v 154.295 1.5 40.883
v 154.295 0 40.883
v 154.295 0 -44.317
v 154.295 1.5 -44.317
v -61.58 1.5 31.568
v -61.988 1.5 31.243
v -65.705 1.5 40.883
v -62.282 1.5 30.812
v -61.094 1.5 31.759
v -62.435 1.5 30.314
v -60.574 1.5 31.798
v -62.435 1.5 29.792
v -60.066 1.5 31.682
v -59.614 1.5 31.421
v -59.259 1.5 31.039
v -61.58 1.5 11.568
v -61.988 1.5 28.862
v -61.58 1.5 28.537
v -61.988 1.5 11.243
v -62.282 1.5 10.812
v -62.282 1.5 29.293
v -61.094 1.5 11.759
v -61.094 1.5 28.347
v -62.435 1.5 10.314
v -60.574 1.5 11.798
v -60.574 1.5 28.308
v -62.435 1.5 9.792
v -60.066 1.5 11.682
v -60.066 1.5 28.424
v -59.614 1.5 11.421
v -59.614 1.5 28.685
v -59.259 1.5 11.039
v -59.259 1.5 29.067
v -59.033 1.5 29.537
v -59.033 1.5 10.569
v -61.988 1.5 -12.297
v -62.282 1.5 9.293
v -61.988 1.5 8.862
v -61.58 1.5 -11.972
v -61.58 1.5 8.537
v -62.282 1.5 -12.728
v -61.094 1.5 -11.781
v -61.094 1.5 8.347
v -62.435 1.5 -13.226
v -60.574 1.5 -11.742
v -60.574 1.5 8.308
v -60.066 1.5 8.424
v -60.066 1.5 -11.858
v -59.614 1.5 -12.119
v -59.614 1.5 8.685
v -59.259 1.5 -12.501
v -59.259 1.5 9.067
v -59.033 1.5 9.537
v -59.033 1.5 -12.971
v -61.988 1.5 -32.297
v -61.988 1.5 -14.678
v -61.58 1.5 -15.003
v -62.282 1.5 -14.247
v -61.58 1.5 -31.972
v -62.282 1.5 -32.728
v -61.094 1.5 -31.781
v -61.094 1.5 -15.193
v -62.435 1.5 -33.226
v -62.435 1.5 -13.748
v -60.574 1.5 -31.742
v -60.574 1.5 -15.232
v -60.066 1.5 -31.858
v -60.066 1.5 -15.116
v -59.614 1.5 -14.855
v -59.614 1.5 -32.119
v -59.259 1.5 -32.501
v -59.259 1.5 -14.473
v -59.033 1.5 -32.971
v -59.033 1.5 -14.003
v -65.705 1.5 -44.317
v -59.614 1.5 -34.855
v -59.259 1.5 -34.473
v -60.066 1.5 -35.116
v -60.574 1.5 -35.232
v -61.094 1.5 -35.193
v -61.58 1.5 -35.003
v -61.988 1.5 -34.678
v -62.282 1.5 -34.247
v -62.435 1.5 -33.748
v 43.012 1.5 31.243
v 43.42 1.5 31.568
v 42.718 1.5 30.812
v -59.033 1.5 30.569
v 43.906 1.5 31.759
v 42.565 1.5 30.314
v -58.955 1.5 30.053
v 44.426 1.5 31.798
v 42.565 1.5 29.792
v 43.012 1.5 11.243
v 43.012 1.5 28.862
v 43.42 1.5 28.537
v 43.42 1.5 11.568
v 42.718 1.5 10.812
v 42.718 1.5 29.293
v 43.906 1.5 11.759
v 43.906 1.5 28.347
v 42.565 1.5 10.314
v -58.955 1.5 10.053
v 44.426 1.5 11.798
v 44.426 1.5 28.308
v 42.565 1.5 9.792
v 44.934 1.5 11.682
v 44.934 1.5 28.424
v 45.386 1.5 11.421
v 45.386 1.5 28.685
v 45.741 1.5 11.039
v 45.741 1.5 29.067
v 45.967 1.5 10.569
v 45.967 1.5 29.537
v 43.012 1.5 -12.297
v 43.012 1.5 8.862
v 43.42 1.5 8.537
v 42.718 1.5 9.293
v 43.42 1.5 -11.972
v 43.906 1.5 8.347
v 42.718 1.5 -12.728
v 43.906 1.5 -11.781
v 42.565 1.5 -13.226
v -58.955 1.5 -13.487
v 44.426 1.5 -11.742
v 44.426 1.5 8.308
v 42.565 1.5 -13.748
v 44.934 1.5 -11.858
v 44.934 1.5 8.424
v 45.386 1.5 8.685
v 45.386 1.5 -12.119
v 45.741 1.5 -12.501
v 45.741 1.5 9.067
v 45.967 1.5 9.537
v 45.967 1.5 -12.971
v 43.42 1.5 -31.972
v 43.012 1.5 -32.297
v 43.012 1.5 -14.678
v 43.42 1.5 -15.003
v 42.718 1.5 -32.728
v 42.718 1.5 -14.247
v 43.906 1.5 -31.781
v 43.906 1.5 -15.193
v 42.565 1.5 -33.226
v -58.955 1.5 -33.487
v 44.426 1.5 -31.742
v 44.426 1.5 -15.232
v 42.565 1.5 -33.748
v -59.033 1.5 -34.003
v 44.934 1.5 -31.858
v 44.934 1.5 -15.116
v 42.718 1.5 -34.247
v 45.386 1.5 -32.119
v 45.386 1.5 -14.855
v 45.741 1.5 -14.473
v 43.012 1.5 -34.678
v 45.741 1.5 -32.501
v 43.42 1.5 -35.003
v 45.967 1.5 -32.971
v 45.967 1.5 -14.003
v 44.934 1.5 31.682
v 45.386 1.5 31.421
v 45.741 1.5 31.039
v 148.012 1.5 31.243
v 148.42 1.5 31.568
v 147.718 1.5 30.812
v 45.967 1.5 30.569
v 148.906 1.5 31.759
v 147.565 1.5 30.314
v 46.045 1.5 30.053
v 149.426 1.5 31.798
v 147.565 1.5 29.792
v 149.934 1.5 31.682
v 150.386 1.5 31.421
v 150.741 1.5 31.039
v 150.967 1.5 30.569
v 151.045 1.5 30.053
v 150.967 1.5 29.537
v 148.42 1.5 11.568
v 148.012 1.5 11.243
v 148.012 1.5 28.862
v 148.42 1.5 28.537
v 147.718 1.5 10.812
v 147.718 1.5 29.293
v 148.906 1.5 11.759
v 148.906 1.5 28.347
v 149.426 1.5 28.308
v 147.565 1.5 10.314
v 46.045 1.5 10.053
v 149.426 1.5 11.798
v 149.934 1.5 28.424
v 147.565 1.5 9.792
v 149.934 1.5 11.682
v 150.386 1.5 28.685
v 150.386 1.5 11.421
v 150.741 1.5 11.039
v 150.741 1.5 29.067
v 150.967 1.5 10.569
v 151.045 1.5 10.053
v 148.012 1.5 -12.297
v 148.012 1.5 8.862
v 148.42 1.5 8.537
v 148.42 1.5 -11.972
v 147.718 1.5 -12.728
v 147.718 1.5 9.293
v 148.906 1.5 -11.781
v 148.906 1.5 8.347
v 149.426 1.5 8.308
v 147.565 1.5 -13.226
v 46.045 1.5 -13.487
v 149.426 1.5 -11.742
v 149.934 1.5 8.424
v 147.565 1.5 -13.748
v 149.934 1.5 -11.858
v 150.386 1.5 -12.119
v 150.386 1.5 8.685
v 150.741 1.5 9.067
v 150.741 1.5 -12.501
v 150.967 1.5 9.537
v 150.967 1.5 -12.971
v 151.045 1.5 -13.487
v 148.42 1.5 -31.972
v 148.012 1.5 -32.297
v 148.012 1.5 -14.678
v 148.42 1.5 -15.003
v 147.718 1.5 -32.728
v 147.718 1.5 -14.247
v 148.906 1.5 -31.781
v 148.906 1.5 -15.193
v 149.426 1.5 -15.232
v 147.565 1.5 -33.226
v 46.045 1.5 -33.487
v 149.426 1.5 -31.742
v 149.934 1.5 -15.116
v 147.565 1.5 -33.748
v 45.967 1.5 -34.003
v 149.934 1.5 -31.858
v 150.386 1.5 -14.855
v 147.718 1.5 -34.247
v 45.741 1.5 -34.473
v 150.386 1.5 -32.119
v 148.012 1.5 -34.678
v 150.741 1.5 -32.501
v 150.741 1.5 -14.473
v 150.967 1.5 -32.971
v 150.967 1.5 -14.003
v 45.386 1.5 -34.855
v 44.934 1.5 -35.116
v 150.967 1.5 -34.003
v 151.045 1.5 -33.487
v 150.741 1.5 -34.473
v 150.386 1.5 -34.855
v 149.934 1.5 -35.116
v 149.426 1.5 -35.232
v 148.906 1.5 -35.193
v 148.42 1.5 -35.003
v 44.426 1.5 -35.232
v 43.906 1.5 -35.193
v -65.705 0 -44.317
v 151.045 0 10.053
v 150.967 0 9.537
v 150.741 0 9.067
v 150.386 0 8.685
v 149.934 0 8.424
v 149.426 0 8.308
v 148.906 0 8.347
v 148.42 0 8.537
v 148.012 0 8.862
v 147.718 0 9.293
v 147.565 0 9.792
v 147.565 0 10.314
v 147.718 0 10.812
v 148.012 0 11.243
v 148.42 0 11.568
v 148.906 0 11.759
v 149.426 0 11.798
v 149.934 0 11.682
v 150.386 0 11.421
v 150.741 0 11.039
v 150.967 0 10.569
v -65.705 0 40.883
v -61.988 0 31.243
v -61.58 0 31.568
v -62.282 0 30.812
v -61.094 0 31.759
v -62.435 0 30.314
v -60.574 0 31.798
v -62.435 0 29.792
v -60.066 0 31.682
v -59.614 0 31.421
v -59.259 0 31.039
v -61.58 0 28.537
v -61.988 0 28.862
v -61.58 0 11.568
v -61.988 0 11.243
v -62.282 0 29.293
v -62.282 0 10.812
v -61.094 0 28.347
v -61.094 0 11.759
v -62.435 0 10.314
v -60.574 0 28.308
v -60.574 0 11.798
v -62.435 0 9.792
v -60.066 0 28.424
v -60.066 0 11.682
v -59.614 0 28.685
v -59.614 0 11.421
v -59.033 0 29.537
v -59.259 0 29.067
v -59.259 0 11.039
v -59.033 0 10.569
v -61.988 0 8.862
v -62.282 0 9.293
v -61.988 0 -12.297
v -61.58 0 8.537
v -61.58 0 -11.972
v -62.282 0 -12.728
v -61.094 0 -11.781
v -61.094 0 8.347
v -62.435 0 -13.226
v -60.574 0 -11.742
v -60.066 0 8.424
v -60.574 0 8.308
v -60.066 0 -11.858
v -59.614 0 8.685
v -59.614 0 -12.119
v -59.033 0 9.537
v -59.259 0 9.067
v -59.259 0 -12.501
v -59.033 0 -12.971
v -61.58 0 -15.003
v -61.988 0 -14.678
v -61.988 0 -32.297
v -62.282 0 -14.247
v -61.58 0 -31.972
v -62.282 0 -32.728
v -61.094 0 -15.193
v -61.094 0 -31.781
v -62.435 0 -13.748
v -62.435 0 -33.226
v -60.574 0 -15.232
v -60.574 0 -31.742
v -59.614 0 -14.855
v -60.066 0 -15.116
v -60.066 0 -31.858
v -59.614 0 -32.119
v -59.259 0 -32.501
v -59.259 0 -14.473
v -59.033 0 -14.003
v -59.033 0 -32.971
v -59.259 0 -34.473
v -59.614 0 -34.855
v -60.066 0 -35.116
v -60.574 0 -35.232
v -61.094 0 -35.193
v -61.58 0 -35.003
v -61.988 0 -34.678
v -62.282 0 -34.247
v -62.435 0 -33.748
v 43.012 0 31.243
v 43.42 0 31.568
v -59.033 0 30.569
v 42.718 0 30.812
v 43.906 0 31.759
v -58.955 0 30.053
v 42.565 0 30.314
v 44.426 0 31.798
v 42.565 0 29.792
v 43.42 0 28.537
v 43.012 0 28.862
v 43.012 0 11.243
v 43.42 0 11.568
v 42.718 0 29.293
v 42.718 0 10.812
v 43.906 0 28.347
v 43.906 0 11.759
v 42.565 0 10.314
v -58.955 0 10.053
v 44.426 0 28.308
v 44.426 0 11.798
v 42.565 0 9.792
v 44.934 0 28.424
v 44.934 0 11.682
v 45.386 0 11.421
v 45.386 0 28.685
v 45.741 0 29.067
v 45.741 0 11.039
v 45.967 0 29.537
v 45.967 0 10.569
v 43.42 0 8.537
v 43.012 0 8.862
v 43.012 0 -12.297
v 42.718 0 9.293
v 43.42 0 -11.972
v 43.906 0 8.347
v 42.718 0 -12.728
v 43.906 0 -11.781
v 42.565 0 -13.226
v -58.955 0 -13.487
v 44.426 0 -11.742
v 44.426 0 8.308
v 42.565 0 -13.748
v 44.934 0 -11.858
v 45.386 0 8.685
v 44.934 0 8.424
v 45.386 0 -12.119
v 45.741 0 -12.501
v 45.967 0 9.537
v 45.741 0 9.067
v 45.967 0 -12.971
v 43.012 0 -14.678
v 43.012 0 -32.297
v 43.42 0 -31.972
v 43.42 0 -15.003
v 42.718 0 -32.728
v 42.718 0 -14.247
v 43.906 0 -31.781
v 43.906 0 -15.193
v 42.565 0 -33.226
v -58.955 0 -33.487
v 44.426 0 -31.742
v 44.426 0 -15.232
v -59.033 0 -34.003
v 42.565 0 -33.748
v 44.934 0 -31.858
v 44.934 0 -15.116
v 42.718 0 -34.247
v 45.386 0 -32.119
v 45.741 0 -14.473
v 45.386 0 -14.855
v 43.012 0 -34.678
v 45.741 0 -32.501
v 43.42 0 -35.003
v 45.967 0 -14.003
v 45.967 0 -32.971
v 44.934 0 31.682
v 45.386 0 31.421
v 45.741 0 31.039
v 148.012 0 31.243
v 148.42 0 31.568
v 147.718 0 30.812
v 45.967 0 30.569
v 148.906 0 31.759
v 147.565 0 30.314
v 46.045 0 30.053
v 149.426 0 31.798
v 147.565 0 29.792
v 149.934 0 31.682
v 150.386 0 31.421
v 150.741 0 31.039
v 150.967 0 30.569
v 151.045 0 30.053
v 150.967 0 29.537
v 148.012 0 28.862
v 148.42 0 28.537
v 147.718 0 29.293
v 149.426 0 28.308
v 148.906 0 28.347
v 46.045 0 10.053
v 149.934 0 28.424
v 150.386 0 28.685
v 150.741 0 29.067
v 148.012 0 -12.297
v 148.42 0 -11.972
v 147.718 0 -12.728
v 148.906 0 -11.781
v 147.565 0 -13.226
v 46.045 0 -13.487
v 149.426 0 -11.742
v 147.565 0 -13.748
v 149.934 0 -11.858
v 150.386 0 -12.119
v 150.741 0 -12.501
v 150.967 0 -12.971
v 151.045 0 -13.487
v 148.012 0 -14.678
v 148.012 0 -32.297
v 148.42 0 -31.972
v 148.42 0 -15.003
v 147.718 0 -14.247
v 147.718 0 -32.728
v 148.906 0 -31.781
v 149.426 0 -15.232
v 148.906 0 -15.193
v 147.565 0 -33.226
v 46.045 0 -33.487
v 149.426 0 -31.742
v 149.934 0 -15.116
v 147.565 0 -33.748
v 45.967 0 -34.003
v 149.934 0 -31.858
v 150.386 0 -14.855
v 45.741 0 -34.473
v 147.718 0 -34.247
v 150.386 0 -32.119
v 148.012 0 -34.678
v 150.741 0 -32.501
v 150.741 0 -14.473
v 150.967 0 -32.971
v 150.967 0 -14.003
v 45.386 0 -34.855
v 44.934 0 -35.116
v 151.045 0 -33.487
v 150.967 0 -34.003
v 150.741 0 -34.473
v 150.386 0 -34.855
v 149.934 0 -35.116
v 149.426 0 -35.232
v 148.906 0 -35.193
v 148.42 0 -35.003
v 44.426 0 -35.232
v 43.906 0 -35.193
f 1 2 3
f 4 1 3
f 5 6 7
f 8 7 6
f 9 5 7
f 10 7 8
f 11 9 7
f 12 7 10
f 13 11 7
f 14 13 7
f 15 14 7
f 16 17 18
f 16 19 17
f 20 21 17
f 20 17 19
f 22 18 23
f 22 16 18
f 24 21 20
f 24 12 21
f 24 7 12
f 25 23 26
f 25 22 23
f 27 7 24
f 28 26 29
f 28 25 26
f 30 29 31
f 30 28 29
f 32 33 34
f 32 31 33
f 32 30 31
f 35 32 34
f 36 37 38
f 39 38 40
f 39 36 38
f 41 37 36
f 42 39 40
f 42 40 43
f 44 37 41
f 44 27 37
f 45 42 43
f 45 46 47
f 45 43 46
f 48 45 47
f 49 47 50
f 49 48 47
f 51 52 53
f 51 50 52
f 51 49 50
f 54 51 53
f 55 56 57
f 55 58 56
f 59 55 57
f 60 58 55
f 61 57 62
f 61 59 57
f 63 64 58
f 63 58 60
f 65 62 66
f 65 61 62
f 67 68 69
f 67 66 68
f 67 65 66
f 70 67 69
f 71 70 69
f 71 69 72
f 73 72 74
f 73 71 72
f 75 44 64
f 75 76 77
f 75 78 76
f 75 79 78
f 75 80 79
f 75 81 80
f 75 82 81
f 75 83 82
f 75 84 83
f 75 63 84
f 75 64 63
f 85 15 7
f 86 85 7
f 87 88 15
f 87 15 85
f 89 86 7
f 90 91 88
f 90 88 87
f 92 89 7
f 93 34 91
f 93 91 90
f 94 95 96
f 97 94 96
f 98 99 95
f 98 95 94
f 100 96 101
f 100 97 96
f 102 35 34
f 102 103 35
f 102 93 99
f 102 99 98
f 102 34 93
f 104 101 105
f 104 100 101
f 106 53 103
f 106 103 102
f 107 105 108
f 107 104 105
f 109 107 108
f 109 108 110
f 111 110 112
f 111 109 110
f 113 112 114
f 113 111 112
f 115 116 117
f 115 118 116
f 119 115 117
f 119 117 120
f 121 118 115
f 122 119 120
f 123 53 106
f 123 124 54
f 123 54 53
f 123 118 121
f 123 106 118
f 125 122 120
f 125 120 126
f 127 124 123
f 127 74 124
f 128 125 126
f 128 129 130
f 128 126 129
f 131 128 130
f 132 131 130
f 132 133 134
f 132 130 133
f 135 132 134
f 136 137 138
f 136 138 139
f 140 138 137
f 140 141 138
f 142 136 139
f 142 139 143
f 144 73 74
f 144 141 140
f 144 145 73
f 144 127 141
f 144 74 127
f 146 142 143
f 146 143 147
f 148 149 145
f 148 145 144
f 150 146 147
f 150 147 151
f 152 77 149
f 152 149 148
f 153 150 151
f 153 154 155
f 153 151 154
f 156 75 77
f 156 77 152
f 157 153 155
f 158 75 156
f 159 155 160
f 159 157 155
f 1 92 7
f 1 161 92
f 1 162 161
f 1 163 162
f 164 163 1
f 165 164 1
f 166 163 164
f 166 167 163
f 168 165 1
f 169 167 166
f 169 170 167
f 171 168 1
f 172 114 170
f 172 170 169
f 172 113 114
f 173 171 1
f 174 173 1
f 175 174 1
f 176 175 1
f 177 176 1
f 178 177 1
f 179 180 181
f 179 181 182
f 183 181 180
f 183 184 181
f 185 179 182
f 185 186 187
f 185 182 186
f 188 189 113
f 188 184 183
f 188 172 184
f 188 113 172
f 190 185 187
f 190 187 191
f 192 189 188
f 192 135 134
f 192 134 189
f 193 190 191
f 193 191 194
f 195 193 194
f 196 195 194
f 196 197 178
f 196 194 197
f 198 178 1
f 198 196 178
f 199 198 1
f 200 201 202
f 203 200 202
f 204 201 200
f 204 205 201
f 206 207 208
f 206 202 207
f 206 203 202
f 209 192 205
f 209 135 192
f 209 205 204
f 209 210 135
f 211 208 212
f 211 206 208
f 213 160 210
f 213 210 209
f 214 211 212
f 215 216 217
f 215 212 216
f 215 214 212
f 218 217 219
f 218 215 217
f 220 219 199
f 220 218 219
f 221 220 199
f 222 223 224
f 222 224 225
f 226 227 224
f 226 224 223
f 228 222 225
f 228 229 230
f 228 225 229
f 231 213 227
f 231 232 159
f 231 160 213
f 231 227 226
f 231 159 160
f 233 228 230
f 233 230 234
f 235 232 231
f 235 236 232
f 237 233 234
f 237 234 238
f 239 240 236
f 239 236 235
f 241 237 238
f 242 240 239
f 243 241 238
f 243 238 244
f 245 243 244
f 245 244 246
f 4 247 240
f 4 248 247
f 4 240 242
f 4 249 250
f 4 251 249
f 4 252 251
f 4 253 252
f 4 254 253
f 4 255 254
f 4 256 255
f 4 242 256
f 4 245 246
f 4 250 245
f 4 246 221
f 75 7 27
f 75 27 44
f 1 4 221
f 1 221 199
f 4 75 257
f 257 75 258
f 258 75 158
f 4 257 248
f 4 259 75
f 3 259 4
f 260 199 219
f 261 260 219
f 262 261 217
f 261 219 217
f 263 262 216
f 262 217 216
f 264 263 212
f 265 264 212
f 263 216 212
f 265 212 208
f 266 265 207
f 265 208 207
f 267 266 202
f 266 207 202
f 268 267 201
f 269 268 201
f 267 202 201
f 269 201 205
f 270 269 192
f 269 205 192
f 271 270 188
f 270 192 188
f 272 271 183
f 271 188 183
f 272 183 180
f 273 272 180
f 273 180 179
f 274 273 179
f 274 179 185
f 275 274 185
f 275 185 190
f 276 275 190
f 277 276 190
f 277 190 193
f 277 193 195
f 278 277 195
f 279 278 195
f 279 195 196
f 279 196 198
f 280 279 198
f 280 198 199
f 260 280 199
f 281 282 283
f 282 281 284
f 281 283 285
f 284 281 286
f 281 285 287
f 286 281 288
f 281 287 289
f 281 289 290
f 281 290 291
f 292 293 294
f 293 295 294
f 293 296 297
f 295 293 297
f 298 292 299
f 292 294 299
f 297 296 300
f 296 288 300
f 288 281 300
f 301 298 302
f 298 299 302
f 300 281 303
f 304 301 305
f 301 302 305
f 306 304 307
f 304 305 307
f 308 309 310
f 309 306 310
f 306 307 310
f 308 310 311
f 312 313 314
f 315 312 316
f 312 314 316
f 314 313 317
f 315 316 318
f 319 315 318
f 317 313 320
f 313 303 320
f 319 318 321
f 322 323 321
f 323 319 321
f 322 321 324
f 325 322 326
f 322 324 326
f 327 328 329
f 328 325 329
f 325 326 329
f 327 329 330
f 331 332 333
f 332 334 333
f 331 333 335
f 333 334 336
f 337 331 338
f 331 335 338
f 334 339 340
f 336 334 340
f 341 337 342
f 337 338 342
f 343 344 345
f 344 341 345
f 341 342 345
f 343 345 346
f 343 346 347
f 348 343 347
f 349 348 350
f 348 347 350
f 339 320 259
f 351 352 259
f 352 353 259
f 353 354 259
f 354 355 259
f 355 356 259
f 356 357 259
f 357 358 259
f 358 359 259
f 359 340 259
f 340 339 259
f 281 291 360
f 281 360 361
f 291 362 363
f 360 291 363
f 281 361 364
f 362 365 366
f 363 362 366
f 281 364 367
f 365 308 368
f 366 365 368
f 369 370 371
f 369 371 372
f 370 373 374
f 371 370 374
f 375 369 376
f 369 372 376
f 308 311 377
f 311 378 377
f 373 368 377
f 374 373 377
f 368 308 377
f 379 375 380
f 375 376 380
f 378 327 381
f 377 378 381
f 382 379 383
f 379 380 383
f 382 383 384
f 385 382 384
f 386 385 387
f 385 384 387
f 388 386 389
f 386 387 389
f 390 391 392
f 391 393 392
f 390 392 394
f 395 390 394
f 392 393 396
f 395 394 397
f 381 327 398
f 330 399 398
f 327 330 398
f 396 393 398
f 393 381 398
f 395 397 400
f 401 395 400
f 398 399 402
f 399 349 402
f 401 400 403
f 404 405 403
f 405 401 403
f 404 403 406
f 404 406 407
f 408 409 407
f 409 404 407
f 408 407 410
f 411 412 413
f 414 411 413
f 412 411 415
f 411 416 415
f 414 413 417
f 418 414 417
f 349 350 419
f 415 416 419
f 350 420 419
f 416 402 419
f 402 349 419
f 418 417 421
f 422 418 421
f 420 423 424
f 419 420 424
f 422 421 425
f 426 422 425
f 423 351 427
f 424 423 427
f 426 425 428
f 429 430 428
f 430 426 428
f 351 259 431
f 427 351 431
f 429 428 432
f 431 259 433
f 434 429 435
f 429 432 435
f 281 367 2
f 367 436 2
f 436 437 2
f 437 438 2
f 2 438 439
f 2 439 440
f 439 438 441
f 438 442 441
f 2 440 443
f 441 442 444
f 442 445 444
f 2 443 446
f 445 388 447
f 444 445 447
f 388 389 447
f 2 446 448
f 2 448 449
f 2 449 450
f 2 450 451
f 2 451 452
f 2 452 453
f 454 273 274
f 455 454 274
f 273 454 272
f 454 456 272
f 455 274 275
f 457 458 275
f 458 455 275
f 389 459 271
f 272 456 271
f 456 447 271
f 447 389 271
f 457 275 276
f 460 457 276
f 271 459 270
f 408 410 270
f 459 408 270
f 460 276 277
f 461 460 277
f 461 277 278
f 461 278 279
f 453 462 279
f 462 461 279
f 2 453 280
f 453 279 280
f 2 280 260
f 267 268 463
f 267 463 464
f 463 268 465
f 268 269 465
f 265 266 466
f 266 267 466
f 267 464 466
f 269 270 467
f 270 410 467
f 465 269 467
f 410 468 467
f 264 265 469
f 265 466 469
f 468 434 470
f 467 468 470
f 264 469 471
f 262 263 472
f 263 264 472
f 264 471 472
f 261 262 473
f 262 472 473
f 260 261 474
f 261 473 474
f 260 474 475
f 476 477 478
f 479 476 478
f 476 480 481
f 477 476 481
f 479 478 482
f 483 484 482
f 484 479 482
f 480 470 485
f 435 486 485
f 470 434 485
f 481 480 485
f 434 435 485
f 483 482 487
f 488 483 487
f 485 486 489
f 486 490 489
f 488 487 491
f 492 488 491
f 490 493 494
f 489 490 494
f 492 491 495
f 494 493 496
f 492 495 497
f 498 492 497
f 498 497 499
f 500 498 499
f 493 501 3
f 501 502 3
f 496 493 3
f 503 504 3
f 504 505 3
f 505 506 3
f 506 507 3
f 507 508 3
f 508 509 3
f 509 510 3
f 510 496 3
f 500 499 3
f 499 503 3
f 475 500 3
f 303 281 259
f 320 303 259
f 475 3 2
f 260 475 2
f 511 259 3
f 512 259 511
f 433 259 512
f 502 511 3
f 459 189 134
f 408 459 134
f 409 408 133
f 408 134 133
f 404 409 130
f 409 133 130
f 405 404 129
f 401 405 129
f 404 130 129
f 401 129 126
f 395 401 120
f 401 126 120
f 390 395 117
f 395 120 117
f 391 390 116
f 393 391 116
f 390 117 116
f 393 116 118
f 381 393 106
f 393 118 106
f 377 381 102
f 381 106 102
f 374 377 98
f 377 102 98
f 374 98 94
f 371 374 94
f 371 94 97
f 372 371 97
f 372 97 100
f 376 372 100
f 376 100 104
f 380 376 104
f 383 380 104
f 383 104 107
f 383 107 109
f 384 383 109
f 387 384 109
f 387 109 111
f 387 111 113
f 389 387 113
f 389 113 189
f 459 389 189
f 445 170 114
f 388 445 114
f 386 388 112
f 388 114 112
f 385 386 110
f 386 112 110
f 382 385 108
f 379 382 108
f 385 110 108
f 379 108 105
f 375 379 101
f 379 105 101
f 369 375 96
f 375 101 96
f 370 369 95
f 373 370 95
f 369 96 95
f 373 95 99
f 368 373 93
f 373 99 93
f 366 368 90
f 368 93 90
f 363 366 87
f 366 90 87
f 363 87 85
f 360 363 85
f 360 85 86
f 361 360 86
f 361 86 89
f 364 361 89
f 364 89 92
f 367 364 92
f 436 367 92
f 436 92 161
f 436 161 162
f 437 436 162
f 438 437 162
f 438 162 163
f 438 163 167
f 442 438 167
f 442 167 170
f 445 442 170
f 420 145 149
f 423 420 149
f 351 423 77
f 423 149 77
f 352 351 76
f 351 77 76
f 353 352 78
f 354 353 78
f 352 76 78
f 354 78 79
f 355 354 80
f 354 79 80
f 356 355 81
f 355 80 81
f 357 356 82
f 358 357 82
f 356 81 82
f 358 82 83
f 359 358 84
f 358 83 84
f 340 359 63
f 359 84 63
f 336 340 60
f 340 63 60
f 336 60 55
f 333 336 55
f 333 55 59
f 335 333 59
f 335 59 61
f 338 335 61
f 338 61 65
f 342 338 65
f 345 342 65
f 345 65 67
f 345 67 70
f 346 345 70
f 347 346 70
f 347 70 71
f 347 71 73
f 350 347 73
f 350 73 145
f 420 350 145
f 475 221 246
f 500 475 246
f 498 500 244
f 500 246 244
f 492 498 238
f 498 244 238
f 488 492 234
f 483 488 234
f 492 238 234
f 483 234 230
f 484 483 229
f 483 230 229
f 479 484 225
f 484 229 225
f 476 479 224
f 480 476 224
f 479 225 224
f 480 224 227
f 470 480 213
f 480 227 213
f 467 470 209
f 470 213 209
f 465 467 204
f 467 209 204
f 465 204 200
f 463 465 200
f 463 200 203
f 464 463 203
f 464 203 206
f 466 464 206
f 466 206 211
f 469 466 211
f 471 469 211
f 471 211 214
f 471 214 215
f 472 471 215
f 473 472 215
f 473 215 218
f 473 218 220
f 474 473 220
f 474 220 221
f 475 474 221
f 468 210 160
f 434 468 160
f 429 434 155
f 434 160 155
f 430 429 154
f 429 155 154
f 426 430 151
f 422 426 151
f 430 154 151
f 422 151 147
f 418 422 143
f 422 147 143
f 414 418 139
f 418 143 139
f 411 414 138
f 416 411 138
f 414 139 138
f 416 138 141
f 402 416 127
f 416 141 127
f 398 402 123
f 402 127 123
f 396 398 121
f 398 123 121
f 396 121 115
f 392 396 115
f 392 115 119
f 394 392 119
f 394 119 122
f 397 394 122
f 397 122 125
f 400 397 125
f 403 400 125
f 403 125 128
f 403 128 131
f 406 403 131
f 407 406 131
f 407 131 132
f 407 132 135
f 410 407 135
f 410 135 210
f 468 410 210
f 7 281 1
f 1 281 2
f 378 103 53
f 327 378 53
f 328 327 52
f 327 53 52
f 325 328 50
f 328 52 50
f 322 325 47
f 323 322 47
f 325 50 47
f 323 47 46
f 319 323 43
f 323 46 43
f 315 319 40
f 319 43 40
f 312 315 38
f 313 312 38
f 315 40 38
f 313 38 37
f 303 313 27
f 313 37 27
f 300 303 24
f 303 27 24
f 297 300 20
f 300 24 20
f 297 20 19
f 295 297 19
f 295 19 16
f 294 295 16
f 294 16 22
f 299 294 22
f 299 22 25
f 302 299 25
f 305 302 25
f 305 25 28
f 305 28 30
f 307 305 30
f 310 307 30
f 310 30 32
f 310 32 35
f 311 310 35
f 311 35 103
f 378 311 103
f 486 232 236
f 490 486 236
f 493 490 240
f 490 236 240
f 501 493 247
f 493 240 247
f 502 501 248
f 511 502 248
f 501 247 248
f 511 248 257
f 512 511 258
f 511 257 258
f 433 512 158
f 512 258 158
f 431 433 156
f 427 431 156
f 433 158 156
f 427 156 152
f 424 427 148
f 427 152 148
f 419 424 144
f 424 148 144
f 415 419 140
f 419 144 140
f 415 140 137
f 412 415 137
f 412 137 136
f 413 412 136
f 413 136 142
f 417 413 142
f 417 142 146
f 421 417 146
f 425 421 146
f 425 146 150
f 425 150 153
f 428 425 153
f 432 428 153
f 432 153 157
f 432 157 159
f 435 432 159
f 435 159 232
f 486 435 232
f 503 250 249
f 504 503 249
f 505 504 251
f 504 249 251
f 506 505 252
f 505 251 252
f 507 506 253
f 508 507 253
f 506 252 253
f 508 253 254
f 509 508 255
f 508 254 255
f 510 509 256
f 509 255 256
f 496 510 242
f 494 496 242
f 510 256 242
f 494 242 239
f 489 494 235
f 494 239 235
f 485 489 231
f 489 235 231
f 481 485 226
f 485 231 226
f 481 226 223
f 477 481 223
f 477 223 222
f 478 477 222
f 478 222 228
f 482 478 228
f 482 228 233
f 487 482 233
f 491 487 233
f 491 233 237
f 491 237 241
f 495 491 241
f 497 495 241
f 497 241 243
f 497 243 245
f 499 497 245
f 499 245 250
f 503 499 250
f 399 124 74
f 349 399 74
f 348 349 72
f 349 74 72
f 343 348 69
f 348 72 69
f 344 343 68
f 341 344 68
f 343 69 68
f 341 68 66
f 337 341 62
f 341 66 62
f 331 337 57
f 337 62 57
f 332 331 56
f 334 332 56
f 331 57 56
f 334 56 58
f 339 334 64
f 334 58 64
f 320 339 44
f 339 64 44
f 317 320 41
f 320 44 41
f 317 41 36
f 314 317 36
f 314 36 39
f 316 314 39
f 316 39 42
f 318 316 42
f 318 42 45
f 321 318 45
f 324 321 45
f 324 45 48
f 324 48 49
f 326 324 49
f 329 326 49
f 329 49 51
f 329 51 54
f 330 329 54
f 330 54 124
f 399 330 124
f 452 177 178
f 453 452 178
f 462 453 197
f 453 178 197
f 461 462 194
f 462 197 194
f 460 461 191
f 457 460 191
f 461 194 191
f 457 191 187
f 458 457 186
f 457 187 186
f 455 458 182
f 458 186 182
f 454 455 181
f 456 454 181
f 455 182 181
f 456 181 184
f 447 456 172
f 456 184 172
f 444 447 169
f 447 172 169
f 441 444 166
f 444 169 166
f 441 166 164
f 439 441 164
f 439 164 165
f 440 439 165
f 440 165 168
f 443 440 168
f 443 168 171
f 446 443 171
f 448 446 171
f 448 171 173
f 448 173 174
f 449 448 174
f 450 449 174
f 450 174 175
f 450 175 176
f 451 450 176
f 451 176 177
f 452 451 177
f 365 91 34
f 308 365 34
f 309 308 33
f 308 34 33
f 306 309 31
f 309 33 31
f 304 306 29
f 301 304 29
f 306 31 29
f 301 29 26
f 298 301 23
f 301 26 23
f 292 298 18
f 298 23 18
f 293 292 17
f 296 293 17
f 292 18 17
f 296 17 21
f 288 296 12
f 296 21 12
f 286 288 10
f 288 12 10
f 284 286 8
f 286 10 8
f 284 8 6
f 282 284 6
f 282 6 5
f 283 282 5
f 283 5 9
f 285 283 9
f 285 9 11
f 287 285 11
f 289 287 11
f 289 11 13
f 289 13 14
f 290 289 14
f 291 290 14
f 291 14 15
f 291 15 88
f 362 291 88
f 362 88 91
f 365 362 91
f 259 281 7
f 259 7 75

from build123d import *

# Parameters (mm, degrees)
SKETCH_1_W          = 220
SKETCH_1_H          = 85.2
EXTRUDE_1_DEPTH     = 1.5
SKETCH_2_R          = 1.75
CUT_EXTRUDE_1_DEPTH = 10


with BuildPart() as part:
    # 草图1 → 凸台-拉伸1 (new body)
    with BuildSketch(Plane(origin=(0, 0, 0), x_dir=(1, 0, 0), z_dir=(0, 1, 0))):
        with Locations((44.295012832, 1.717252595)):
            Rectangle(SKETCH_1_W, SKETCH_1_H)
    extrude(amount=EXTRUDE_1_DEPTH)

    # 草图2 → 切除-拉伸1 (cut)
    with BuildSketch(Plane(origin=(0, 1.5, 0), x_dir=(1, 0, 0), z_dir=(0, 1, 0))):
        with Locations((149.295012832, -30.052747405)):
            Circle(SKETCH_2_R)
        with Locations((149.295012832, -10.052747405)):
            Circle(SKETCH_2_R)
        with Locations((44.295012832, -10.052747405)):
            Circle(SKETCH_2_R)
        with Locations((44.295012832, -30.052747405)):
            Circle(SKETCH_2_R)
        with Locations((44.295012832, 13.487252595)):
            Circle(SKETCH_2_R)
        with Locations((44.295012832, 33.487252595)):
            Circle(SKETCH_2_R)
        with Locations((149.295012832, 13.487252595)):
            Circle(SKETCH_2_R)
        with Locations((149.295012832, 33.487252595)):
            Circle(SKETCH_2_R)
        with Locations((-60.704987168, 33.487252595)):
            Circle(SKETCH_2_R)
        with Locations((-60.704987168, 13.487252595)):
            Circle(SKETCH_2_R)
        with Locations((-60.704987168, -10.052747405)):
            Circle(SKETCH_2_R)
        with Locations((-60.704987168, -30.052747405)):
            Circle(SKETCH_2_R)
    extrude(amount=-CUT_EXTRUDE_1_DEPTH, mode=Mode.SUBTRACT)


solid = part.part
